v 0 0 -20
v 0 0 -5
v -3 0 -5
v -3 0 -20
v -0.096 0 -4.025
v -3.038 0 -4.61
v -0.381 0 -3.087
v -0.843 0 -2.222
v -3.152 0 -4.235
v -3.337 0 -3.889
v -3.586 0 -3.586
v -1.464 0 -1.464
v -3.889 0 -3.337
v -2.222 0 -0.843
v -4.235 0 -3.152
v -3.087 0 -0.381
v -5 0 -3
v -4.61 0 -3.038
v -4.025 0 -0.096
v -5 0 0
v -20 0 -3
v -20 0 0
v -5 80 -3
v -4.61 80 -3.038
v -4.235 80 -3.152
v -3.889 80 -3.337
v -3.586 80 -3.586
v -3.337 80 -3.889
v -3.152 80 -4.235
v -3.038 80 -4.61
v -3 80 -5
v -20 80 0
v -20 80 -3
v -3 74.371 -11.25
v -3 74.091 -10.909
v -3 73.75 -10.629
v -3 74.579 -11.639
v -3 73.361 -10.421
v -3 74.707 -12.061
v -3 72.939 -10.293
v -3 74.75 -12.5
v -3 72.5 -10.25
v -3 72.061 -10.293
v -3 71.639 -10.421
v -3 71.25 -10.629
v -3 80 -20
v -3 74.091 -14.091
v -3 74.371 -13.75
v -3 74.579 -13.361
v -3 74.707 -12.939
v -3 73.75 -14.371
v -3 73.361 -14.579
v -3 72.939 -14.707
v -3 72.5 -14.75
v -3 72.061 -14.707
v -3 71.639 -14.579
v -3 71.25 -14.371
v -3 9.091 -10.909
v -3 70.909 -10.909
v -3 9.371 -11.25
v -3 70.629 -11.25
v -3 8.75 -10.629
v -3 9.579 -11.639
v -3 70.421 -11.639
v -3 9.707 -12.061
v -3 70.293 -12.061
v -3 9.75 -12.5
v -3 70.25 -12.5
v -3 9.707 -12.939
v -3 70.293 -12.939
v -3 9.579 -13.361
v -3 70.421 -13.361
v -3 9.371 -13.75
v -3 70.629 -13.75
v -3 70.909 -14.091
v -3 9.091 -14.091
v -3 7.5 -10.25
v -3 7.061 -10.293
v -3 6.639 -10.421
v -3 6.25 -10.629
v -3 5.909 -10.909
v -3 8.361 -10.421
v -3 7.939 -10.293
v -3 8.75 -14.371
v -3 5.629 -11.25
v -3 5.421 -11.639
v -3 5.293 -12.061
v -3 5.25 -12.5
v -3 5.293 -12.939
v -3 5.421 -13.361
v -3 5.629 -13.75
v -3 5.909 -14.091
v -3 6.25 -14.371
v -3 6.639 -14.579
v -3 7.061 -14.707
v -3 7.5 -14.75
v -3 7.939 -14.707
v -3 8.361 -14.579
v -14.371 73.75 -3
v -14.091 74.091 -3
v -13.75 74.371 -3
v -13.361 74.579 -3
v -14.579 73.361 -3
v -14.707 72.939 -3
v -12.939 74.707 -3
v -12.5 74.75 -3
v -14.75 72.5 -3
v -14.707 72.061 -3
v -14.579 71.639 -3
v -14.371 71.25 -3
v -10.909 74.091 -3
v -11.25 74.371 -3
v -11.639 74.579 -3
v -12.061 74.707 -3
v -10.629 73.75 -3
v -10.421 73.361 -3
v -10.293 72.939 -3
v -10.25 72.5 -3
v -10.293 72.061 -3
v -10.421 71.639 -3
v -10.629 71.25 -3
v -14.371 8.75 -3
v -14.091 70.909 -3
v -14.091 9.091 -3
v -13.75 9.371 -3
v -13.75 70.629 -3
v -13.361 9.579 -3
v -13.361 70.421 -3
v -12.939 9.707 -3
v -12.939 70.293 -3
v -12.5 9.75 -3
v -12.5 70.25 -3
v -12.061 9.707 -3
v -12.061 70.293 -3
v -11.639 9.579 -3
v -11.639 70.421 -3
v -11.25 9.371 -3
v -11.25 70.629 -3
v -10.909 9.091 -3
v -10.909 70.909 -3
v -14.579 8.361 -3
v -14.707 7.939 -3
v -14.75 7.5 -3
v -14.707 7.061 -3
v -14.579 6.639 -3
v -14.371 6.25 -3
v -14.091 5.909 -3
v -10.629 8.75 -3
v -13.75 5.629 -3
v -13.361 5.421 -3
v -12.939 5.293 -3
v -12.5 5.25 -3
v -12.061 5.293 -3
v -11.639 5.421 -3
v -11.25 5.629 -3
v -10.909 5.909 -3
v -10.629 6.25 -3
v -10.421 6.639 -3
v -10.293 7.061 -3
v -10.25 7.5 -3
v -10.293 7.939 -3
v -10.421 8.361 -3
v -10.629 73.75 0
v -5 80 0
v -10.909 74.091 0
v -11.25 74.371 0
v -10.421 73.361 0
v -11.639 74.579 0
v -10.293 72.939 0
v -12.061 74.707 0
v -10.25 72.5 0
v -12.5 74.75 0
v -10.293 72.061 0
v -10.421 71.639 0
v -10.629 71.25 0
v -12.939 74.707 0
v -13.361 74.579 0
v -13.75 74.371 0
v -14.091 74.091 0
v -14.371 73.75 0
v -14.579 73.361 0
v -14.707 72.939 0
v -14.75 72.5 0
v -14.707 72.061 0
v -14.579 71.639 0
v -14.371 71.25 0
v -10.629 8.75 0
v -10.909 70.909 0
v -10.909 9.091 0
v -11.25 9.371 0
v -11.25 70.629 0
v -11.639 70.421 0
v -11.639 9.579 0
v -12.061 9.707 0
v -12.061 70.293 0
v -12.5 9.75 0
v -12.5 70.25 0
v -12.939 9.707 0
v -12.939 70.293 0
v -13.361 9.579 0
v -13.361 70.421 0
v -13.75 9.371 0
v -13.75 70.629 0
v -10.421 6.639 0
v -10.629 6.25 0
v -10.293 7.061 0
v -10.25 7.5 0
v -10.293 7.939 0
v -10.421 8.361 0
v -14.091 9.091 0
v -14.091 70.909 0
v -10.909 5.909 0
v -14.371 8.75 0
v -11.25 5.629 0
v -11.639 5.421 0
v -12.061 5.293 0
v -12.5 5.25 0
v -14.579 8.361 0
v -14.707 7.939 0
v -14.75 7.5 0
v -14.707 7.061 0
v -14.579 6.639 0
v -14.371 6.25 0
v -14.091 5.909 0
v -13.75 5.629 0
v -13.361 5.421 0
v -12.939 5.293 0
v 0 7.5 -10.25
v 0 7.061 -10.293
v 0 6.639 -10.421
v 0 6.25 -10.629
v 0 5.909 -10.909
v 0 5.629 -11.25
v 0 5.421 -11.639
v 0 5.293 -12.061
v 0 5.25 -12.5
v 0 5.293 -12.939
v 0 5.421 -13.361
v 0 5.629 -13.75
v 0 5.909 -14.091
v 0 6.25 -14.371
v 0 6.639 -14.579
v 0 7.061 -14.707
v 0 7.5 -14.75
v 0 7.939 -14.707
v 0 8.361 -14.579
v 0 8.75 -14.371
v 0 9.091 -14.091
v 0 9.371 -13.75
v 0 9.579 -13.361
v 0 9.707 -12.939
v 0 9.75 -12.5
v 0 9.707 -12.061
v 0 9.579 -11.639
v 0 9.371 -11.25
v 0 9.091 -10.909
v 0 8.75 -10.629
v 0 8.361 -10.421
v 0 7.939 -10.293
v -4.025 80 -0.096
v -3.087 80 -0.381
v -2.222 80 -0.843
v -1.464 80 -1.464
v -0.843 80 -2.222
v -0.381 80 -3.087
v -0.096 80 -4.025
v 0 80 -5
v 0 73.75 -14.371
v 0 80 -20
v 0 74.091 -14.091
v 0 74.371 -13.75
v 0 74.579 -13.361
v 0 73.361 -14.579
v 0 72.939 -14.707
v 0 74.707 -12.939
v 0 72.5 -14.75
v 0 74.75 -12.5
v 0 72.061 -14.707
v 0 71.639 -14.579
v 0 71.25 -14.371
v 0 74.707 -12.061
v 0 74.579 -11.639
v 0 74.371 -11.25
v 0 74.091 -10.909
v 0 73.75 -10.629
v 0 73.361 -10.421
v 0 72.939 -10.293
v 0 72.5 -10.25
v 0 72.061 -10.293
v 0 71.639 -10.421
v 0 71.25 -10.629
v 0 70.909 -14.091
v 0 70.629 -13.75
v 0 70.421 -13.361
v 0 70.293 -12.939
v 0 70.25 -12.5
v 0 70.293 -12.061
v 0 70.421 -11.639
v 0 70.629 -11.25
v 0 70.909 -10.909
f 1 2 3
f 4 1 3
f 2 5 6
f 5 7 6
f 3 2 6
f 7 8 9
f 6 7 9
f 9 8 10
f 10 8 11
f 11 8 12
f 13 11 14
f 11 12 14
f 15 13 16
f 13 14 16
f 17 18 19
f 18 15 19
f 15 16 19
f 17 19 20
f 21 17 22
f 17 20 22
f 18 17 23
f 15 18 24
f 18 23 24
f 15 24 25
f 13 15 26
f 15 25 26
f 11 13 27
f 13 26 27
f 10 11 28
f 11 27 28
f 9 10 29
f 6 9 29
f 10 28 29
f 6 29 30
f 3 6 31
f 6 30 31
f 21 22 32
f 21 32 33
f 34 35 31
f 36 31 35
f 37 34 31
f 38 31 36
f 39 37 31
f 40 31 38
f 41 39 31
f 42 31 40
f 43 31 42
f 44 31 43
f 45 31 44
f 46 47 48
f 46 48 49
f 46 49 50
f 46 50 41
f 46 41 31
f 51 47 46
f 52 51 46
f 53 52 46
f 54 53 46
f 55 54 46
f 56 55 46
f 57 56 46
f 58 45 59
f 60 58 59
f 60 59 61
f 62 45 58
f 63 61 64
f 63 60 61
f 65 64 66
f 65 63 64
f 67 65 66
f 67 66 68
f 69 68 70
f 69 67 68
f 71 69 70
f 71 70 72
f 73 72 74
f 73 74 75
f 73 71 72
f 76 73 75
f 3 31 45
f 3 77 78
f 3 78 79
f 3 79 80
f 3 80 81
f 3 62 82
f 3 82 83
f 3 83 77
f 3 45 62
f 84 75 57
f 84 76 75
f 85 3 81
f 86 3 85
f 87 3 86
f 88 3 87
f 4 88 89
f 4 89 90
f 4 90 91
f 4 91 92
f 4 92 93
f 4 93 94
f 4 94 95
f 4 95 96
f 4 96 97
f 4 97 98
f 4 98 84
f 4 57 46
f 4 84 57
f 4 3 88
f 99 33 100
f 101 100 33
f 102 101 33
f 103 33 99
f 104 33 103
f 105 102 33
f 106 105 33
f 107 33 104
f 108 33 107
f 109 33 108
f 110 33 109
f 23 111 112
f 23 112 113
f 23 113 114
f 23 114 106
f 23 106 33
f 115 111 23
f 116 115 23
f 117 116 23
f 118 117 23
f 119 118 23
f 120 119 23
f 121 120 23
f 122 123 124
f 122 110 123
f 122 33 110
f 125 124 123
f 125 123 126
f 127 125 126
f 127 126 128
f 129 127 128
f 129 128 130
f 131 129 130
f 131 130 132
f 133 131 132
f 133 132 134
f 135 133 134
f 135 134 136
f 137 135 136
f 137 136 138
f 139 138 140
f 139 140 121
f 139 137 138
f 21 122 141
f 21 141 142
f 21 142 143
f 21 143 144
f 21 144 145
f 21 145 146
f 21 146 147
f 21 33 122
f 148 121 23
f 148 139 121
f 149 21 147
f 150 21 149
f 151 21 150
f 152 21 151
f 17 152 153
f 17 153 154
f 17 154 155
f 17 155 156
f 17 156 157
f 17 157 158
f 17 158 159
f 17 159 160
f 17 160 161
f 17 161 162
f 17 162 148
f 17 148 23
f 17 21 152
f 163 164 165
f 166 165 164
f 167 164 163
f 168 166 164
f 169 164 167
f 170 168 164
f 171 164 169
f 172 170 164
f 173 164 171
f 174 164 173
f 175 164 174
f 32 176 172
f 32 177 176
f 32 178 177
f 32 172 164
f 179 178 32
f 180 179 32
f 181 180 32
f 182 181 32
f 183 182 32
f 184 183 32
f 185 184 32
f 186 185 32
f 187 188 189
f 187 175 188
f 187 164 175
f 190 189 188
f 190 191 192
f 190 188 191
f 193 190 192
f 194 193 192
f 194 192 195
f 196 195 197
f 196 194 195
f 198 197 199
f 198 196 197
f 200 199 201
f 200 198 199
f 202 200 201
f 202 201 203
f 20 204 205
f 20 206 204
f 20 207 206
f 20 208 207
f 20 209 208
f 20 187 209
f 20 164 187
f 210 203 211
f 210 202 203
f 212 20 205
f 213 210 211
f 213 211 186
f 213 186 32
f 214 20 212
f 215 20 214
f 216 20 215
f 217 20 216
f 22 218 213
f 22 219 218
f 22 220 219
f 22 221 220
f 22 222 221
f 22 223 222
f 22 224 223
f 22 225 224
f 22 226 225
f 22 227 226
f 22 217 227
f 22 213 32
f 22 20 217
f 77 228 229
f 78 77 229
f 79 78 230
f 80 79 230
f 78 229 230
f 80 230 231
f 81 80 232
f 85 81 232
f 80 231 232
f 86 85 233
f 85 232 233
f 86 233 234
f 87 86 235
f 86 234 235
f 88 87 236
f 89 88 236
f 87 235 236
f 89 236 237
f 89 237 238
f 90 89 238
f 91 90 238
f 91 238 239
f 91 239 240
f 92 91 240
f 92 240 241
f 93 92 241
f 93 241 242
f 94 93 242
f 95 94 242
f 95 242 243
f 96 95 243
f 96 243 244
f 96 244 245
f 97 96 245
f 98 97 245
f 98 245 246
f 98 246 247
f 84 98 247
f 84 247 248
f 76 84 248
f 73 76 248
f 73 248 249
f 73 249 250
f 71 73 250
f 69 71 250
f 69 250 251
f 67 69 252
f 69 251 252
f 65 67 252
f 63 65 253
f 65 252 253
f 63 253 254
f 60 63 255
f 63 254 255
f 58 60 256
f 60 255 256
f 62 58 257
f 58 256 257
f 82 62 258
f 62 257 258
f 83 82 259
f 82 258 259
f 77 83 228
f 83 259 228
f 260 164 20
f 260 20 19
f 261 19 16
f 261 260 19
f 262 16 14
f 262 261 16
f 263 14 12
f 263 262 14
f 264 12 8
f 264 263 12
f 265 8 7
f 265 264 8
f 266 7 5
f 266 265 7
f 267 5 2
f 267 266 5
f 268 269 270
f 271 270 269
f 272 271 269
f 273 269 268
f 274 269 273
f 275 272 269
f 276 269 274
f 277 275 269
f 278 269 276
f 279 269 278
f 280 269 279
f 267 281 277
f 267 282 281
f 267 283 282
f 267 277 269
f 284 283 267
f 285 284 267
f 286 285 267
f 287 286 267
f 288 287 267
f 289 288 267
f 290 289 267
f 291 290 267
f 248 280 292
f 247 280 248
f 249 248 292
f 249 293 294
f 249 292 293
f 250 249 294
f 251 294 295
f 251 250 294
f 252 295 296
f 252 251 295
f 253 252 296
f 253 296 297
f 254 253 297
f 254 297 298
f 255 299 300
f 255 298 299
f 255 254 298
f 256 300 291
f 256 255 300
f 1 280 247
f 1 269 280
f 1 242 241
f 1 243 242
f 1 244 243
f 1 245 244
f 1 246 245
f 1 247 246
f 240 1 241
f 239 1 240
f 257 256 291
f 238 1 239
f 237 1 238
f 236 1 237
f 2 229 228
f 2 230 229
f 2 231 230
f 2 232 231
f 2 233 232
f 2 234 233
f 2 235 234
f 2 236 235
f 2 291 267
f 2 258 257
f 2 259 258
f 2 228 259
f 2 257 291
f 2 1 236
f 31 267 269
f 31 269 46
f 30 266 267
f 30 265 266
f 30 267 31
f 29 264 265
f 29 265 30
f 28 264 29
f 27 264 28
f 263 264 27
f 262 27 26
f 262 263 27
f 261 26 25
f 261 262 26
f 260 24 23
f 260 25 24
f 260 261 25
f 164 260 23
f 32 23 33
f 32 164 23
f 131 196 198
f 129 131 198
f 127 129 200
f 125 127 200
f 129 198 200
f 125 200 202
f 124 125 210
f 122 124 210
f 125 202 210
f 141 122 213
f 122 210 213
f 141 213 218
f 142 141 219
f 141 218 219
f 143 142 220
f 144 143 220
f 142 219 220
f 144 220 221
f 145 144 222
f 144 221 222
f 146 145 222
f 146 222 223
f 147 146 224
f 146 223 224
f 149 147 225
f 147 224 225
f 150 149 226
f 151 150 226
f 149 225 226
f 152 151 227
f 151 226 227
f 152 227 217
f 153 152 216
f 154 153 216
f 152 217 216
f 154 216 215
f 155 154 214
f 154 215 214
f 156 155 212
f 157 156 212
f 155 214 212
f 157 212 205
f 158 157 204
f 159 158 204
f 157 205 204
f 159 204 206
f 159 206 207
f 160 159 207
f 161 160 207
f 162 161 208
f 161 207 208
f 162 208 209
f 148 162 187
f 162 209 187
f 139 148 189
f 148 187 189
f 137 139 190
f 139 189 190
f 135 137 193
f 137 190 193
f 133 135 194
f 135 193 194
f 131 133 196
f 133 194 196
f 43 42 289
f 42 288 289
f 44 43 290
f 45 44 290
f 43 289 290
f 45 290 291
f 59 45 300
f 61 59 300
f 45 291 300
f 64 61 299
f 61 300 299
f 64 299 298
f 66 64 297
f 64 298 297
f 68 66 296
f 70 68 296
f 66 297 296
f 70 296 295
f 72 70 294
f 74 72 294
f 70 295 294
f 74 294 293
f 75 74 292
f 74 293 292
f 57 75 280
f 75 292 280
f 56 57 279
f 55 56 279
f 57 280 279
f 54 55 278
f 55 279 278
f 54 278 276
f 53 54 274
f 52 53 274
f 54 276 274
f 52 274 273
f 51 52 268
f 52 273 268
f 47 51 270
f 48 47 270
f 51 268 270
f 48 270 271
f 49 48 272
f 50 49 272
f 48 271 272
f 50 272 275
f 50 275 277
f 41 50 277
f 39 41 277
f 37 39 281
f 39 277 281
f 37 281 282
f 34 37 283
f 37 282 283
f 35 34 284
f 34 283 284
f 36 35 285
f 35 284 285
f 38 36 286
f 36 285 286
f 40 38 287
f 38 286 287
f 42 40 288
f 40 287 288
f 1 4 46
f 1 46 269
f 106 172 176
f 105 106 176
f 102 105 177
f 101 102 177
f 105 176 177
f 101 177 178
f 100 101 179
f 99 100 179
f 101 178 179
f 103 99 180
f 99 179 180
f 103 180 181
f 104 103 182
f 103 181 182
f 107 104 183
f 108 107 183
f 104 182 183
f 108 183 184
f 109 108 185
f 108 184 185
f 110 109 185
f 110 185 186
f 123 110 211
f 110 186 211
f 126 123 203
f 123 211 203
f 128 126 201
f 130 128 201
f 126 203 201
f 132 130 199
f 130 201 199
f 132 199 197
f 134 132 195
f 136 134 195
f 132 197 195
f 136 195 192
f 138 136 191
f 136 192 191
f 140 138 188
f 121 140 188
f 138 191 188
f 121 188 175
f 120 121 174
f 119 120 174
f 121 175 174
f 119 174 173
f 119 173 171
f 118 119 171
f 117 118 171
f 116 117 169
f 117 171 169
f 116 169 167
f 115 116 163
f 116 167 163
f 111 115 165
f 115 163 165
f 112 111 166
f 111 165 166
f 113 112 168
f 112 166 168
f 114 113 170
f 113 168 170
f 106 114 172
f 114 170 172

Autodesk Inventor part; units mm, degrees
ref_plane "YZ Plane" through (0, 0, 0) normal (1, 0, 0) x (0, 1, 0)
ref_plane "XZ Plane" through (0, 0, 0) normal (0, 1, 0) x (-1, 0, 0)
ref_plane "XY Plane" through (0, 0, 0) normal (0, 0, 1) x (1, 0, 0)
sketch "Sketch1" plane through (0, 0, 0) normal (0, 1, 0) x (-1, 0, 0)
  line L0 (0, 0) -> (20, 0)
  line L1 (20, 0) -> (20, -3)
  line L2 (20, -3) -> (0, -3)
  line L3 (0, -3) -> (0, 0)
  line L4 (0, 0) -> (3, 0)
  line L5 (3, 0) -> (3, -20)
  line L6 (3, -20) -> (0, -20)
  line L7 (0, -20) -> (0, 0)
  dimension "d0" = 3
  dimension "d1" = 3
  dimension "d2" = 20
  dimension "d3" = 20
extrude "Extrusion1" add sketch "Sketch1" along normal blind 80
fillet "Fillet1" radius 2 1 edges at (-3, 40, -3)
fillet "Fillet2" radius 5 1 edges at (0, 40, 0)
sketch "Sketch2" plane through (-3, 0, -20) normal (-1, 0, 0) x (0, 0, 1)
  line L0 (0, 80) -> (15, 80) projected
  line L1 (0, 0) -> (15, 0) projected
  line L2 (0, 0) -> (0, 80) projected
  point P0 (20, 0)
  point P1 (7.5, 72.5)
  point P2 (7.5, 7.5)
  dimension "d8" = 7.5
  dimension "d9" = 7.5
  dimension "d10" = 65
  dimension "d11" = 7.5
hole "Hole1" at (-3, 72.5, -12.5) at (-3, 7.5, -12.5) direction (1, 0, 0) diameter 4.5 end through all clearance for "Socket Head Cap Screw" size "M4" standard "Ansi Metric M Profile"
sketch "Sketch3" plane through (-20, 0, -3) normal (0, 0, -1) x (-1, 0, 0)
  line L0 (-15, 80) -> (0, 80) projected
  line L1 (-15, 0) -> (0, 0) projected
  line L2 (0, 0) -> (0, 80) projected
  point P0 (-20, 0)
  point P1 (-7.5, 72.5)
  point P2 (-7.5, 7.5)
  dimension "d19" = 7.5
  dimension "d20" = 7.5
  dimension "d21" = 7.5
  dimension "d29" = 65
hole "Hole2" at (-12.5, 72.5, -3) at (-12.5, 7.5, -3) direction (0, 0, 1) diameter 4.5 end through all clearance for "Socket Head Cap Screw" size "M4" standard "Ansi Metric M Profile"
equation "\"d1\" = d0"
equation "\"d3\" = d2"
equation "\"d9\" = d8"
equation "\"d20\" = d19"
equation "\"d21\" = d19"
properties part number "Timing_Angle Bracket" material "Aluminum 6061"
